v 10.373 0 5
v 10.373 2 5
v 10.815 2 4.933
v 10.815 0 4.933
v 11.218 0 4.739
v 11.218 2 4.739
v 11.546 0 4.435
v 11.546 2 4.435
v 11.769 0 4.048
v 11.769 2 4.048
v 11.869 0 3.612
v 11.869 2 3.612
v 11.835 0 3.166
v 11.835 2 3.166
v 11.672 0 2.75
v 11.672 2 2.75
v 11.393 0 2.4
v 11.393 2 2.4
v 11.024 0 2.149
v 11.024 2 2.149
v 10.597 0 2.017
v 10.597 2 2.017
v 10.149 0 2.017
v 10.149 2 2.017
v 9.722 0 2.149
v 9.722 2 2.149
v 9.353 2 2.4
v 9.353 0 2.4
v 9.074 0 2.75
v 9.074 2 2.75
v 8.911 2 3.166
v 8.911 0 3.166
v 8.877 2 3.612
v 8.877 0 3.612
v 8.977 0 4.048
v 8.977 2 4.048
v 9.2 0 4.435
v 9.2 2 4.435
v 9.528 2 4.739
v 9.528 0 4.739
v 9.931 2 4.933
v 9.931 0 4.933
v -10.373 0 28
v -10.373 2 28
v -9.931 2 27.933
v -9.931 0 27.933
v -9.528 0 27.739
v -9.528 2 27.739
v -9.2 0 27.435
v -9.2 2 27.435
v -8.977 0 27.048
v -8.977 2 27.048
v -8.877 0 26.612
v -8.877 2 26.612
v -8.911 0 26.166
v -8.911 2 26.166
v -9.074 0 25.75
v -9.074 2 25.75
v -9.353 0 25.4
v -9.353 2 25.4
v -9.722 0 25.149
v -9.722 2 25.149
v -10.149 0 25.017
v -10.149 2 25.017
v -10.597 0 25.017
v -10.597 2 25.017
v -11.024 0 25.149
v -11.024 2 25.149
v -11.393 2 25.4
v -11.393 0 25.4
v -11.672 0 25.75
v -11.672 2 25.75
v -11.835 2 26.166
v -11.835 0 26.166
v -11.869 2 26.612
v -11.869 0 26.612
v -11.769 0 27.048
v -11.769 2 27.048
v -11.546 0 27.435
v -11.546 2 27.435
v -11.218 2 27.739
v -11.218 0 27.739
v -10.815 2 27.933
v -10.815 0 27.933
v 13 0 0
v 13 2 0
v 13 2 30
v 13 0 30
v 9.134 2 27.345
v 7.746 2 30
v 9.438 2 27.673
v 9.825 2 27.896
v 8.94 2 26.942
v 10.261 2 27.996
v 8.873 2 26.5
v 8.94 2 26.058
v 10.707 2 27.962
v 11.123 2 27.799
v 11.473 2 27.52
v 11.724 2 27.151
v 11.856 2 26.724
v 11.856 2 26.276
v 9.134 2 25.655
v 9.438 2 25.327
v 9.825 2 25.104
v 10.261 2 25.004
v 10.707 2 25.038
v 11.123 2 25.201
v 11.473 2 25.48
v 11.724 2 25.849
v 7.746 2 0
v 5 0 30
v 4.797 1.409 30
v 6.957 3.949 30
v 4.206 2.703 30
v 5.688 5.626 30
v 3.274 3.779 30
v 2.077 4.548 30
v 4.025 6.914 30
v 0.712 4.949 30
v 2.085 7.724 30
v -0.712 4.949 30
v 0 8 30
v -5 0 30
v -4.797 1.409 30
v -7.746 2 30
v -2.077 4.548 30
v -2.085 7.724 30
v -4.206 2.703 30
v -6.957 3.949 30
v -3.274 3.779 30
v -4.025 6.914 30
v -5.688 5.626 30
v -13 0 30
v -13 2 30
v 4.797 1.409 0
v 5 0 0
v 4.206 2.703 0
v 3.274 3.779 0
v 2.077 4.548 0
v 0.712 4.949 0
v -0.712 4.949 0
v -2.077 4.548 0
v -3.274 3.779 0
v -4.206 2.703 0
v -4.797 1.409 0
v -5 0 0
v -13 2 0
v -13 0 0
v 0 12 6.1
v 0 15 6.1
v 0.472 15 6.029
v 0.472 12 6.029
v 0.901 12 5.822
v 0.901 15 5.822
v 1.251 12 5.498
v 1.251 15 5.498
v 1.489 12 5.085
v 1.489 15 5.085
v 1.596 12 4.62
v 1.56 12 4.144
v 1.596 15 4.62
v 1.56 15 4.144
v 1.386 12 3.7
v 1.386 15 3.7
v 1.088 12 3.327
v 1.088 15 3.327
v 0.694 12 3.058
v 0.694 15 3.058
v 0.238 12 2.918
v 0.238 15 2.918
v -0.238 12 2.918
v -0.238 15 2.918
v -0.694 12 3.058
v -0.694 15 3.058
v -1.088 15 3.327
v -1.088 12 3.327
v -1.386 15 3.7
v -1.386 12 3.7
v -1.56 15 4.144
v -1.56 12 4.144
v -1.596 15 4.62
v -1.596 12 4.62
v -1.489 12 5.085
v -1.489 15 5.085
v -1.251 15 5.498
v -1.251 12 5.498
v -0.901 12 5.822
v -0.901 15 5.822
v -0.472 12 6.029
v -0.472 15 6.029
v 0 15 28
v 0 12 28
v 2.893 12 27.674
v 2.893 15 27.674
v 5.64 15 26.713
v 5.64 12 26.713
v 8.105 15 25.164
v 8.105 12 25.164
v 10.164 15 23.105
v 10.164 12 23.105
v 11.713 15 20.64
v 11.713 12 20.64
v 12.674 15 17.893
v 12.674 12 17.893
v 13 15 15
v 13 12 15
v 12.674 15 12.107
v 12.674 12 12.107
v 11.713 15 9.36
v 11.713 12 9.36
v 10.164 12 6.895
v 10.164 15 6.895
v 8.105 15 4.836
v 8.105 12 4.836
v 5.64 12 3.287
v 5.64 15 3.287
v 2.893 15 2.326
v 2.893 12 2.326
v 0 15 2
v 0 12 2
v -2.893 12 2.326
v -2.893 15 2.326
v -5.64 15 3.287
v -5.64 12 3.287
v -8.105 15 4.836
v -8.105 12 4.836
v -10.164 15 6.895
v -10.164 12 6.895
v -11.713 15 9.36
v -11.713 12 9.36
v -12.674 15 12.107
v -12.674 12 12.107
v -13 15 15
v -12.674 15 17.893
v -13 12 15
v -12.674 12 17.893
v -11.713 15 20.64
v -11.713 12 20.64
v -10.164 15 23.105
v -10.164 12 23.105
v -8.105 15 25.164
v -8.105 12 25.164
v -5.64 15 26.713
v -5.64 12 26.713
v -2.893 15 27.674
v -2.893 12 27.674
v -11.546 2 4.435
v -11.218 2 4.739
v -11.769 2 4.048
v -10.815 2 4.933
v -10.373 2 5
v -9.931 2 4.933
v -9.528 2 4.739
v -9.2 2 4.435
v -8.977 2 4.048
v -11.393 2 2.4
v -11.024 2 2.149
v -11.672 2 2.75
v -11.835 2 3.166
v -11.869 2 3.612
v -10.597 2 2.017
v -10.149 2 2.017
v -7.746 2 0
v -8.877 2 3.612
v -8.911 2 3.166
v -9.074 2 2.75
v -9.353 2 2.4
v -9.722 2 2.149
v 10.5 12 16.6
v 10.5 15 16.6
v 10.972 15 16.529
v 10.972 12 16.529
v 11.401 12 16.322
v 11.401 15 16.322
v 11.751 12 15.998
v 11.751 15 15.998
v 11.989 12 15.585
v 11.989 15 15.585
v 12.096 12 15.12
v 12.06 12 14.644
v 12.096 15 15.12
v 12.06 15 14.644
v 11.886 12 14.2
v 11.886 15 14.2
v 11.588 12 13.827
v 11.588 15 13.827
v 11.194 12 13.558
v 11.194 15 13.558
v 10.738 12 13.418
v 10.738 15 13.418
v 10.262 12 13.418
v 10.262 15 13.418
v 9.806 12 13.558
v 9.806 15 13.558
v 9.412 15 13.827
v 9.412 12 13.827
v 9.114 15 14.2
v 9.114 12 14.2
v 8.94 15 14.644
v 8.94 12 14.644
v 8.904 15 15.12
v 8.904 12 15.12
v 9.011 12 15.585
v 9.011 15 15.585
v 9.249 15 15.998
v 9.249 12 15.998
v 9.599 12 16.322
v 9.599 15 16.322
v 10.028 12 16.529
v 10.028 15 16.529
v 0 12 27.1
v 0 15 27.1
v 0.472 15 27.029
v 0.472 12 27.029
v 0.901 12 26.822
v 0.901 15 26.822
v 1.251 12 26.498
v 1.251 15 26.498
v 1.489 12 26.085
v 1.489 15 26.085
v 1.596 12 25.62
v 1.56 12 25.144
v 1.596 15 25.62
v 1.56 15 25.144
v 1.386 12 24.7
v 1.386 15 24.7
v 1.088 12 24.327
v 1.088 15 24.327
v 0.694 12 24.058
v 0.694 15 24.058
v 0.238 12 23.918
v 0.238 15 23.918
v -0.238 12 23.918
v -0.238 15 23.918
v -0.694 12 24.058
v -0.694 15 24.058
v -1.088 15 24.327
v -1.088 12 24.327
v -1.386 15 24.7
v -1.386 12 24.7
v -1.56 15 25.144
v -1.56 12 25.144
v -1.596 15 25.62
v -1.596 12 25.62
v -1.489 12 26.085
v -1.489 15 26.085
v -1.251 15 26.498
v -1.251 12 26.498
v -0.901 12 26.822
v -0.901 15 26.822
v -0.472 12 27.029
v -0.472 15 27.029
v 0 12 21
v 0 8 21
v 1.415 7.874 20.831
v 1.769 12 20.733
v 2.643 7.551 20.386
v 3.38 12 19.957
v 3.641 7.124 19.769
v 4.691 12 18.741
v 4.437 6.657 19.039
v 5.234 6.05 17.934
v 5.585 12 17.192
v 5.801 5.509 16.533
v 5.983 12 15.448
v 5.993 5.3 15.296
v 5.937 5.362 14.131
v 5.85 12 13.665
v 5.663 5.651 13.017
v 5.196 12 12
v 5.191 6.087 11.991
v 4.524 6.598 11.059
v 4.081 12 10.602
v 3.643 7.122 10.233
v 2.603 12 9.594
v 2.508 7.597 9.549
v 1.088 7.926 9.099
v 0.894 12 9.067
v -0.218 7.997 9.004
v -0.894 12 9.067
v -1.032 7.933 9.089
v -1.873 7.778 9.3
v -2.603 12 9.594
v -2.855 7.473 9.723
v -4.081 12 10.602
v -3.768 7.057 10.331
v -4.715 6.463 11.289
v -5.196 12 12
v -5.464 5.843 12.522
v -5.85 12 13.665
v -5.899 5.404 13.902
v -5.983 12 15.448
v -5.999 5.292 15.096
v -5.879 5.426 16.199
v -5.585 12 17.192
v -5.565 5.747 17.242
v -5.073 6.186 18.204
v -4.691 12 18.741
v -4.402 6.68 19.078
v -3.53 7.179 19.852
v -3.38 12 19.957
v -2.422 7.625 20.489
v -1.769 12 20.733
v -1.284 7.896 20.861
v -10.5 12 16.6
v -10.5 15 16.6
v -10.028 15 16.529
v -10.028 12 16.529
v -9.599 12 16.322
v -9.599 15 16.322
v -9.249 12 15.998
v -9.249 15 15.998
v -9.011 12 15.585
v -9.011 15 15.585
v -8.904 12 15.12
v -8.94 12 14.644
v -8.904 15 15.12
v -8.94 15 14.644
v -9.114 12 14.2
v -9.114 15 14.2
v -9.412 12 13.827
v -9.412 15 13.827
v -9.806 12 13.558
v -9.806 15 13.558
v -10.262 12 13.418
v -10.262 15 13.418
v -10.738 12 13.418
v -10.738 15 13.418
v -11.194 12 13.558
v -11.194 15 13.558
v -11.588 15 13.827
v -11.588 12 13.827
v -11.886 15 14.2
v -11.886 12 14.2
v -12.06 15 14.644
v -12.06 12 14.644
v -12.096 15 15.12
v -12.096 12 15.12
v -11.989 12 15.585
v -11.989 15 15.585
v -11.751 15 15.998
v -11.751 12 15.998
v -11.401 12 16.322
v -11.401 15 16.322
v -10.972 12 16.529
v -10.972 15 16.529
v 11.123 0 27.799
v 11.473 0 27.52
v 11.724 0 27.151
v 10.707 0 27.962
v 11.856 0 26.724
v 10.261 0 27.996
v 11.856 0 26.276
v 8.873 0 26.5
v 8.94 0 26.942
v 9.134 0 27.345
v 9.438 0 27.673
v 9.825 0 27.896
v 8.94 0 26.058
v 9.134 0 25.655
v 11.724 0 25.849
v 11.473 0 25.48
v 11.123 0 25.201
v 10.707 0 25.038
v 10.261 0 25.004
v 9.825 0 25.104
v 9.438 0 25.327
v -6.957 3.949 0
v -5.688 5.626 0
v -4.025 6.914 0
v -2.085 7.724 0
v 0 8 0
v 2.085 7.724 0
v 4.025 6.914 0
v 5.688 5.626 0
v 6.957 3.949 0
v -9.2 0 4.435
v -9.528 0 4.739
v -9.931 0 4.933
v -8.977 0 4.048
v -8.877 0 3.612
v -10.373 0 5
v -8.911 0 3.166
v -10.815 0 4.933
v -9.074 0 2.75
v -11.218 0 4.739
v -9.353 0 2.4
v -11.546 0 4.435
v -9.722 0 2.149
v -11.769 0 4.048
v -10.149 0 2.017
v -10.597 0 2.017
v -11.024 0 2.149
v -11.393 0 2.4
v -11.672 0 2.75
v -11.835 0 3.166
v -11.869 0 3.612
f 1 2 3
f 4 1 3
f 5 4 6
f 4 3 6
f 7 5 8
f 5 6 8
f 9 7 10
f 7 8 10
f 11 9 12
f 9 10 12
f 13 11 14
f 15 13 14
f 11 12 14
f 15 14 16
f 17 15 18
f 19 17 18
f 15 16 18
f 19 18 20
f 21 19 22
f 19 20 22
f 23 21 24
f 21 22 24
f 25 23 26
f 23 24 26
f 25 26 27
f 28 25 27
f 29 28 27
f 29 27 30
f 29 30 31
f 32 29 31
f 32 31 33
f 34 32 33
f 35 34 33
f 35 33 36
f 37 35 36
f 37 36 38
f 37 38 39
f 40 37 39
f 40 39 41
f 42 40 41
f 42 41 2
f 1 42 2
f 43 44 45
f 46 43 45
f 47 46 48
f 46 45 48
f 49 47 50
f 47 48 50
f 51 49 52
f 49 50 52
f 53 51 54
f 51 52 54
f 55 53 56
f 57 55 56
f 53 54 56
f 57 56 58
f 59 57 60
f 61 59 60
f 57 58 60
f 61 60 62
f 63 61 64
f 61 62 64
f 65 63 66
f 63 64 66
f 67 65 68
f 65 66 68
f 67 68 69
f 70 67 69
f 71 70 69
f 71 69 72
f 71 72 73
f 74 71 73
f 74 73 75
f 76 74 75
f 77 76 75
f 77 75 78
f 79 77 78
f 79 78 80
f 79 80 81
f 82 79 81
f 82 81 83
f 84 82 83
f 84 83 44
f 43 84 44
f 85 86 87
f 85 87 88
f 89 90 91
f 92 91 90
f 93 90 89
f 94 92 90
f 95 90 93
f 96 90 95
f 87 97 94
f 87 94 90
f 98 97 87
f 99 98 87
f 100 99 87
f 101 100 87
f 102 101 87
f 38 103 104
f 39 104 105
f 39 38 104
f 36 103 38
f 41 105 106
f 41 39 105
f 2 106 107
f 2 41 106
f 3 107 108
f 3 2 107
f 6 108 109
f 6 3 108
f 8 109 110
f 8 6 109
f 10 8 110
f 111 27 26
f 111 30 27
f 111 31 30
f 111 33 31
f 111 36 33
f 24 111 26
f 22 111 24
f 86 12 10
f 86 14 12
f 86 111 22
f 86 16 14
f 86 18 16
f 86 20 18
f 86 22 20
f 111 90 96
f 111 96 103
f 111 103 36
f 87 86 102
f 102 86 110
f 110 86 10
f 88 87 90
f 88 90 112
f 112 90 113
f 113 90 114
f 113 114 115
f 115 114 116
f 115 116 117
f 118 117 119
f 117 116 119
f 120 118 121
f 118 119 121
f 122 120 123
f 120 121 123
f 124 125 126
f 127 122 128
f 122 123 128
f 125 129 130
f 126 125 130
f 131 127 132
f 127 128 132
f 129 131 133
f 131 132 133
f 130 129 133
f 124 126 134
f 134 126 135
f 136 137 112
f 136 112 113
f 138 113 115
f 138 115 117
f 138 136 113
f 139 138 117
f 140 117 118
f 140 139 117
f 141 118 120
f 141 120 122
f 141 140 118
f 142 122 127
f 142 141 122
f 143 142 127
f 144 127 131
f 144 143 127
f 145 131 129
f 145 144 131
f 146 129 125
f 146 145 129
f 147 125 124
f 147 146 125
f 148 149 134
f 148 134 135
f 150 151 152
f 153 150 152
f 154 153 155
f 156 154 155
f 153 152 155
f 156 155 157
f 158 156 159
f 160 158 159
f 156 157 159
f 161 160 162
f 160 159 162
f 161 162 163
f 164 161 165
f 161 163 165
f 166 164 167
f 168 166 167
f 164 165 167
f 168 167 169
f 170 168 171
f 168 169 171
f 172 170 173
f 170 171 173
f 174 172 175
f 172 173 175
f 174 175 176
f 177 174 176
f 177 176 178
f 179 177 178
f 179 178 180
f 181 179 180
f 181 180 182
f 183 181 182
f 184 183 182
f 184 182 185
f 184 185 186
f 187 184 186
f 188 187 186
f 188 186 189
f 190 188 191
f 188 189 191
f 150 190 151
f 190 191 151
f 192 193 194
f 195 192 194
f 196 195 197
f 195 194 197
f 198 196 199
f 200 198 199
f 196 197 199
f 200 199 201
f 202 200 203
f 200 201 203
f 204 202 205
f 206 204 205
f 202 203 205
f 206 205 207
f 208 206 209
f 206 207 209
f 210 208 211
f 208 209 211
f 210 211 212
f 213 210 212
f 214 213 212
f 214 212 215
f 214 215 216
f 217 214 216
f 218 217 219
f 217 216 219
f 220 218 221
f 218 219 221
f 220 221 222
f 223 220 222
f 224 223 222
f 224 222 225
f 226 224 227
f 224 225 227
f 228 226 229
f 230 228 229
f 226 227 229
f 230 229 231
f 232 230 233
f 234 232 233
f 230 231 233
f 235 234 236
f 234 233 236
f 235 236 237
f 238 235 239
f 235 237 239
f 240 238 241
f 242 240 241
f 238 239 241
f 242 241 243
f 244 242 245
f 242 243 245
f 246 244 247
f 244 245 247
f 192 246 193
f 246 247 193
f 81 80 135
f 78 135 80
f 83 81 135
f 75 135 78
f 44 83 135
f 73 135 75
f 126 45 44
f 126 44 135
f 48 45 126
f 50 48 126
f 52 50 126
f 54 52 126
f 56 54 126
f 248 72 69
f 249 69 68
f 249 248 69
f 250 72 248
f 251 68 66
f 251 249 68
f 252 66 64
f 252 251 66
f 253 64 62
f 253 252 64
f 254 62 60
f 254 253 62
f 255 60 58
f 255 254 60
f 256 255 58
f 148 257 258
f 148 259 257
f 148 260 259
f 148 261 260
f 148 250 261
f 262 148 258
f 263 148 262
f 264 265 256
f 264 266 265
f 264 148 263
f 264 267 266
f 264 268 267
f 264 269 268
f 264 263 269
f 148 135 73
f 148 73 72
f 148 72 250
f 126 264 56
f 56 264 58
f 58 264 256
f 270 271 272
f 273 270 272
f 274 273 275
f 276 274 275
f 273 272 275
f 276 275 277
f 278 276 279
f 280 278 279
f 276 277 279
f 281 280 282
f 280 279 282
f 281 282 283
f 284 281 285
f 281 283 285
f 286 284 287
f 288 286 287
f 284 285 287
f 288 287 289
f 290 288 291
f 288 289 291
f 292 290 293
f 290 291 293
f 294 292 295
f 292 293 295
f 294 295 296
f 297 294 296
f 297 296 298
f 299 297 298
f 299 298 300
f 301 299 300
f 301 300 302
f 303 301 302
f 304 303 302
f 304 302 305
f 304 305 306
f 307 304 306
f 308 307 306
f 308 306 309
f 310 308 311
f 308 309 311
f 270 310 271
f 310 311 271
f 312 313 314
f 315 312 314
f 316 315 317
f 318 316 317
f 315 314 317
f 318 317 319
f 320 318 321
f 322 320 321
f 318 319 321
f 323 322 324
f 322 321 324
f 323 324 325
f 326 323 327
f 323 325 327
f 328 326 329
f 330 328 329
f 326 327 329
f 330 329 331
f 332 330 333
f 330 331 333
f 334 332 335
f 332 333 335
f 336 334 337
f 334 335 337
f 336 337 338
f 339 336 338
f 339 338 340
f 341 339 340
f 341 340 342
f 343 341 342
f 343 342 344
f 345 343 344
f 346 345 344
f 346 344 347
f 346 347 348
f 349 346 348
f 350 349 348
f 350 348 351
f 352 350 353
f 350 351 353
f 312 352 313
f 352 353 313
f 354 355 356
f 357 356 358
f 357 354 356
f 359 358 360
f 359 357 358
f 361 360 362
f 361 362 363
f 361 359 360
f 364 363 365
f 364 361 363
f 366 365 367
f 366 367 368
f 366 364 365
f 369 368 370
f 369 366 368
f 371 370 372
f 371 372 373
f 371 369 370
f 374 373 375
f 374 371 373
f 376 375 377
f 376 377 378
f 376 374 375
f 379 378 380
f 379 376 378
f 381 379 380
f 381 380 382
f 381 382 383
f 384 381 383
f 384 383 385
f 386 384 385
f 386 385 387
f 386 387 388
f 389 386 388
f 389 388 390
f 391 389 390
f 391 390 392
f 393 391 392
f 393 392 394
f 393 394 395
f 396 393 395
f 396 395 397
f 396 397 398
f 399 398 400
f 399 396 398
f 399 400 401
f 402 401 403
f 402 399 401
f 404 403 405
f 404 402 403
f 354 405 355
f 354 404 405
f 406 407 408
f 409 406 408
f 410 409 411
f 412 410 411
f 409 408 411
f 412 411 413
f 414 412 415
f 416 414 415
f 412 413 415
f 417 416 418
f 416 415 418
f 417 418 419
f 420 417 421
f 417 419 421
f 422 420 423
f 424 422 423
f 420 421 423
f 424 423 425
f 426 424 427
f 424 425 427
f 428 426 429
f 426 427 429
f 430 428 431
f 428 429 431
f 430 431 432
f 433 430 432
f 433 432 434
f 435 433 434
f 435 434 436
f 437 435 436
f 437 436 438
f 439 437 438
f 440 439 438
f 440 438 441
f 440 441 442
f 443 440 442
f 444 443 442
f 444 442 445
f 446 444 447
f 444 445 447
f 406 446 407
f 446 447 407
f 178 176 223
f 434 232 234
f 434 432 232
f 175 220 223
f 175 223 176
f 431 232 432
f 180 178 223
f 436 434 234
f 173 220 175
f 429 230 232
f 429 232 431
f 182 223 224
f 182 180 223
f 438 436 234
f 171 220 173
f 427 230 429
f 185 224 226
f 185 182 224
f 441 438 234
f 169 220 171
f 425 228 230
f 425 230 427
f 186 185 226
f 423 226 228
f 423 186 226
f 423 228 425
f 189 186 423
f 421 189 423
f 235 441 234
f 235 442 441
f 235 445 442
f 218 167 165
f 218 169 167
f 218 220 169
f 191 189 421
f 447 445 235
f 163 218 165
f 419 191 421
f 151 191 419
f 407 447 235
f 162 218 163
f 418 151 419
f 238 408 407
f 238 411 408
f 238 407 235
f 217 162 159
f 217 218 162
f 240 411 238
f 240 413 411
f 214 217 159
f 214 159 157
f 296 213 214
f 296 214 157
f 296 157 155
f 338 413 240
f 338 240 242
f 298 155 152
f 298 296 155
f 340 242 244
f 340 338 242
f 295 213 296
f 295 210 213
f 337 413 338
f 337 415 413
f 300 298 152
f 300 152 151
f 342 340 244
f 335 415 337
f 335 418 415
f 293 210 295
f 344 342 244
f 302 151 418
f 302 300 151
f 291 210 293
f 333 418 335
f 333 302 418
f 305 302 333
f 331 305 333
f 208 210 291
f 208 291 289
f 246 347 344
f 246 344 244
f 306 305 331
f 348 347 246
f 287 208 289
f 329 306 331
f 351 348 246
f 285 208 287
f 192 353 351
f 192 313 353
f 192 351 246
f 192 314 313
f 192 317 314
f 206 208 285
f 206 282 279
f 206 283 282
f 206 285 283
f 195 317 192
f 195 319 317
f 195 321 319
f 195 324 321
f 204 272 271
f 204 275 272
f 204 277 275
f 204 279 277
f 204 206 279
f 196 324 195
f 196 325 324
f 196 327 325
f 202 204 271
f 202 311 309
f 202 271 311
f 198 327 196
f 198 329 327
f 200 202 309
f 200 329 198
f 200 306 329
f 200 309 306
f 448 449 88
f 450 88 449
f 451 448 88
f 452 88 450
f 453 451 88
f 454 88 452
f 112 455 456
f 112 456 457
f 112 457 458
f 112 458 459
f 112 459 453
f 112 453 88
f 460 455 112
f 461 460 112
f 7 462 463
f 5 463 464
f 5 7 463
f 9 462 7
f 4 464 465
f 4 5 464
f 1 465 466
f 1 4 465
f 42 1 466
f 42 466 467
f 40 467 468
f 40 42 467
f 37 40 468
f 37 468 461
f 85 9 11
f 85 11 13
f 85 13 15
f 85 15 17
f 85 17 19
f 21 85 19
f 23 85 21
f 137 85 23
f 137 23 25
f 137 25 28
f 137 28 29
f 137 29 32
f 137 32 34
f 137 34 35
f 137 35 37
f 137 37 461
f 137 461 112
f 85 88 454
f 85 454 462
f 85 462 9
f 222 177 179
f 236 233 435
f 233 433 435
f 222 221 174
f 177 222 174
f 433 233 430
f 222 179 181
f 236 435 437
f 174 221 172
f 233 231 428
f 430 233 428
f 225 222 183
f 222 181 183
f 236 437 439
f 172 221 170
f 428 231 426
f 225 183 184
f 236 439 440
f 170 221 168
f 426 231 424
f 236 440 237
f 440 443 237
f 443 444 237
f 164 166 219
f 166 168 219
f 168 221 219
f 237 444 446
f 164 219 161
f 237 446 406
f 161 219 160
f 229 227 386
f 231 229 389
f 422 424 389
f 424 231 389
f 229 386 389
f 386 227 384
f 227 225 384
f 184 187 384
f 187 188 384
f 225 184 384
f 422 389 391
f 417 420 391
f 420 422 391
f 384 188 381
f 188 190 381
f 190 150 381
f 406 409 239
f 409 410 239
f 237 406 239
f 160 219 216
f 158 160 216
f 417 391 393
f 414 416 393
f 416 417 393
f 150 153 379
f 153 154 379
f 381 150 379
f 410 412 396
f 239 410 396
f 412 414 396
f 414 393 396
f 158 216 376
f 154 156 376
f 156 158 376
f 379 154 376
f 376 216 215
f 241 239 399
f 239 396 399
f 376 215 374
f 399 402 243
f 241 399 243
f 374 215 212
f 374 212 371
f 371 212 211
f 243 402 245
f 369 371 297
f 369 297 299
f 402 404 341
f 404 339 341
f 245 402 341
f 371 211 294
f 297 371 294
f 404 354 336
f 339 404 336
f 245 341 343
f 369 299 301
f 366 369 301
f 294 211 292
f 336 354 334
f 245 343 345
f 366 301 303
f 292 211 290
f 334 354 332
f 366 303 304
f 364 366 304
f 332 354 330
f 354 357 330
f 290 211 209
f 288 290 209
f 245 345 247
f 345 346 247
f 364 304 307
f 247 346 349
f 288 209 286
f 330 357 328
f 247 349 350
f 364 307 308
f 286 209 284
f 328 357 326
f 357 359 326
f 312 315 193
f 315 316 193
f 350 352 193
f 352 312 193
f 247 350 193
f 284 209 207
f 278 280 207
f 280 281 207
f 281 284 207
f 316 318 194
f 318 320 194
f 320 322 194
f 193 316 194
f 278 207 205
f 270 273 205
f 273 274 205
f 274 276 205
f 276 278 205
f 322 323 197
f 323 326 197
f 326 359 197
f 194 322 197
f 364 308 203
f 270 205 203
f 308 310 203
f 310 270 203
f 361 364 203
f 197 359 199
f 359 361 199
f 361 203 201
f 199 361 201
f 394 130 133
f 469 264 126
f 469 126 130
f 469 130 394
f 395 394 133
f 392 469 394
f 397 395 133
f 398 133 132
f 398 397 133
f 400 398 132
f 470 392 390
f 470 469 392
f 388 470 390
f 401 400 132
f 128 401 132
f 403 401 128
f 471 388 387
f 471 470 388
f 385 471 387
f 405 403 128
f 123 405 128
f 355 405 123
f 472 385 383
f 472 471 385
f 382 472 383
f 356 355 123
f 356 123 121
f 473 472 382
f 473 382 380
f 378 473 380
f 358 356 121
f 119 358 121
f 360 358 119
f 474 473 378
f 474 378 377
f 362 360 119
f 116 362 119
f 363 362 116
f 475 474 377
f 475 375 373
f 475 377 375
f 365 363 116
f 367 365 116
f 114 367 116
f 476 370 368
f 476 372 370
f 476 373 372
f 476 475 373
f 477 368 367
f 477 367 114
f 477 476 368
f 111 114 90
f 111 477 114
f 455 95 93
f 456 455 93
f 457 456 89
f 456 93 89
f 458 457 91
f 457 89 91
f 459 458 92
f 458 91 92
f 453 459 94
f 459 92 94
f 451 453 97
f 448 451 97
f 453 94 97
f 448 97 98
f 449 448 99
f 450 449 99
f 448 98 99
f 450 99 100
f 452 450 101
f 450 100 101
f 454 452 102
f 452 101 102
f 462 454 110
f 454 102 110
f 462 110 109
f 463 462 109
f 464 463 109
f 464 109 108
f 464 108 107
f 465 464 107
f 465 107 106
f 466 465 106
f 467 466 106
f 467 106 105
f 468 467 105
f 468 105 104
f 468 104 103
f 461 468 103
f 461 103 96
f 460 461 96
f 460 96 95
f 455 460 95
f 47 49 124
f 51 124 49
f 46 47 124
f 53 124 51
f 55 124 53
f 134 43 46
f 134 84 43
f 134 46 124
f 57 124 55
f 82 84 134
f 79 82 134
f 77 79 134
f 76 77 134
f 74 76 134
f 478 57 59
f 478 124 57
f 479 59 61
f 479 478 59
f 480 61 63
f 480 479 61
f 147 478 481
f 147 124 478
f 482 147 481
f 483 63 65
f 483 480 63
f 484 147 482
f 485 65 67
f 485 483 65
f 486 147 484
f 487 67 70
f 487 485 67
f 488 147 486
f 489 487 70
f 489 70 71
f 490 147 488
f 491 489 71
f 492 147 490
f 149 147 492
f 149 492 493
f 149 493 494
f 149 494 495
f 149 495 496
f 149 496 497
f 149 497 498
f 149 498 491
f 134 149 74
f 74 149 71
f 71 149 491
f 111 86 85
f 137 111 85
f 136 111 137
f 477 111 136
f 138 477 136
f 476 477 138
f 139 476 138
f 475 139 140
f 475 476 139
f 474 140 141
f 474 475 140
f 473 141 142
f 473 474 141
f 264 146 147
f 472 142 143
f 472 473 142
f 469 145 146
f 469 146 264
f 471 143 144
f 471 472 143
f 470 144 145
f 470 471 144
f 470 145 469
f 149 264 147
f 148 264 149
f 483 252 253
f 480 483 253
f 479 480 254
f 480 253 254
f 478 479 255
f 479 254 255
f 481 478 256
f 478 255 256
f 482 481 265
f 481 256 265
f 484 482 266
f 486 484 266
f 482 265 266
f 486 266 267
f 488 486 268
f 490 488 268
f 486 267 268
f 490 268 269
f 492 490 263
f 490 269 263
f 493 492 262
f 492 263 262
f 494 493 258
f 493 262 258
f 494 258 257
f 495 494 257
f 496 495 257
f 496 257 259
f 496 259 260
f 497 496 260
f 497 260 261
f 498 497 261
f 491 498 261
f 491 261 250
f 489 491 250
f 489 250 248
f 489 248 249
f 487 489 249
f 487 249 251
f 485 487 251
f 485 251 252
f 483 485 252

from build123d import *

# Parameters (mm, degrees)
EXTRUDE_1_DEPTH      = 30
SKETCH_2_R           = 1.5
CUT_EXTRUDE_1_DEPTH  = 30
EXTRUDE_2_REACH      = 36.828
EXTRUDE_2_END_RADIUS = 8
SKETCH_3_R           = 6
SKETCH_4_R           = 13
EXTRUDE_3_DEPTH      = 3
SKETCH_6_R           = 1.6
CUT_EXTRUDE_2_DEPTH  = 3


with BuildPart() as part:
    # 草图1 → 凸台-拉伸1 (new body)
    with BuildSketch(Plane.XY):
        with BuildLine():
            Line((-8, 0), (-13, 0))
            Line((-13, 0), (-13, 2))
            Line((-13, 2), (-7.745966692, 2))
            ThreePointArc((-7.745966692, 2), (0, 8), (7.745966692, 2))
            Line((7.745966692, 2), (13, 2))
            Line((13, 2), (13, 0))
            Line((13, 0), (8, 0))
            Line((8, 0), (5, 0))
            ThreePointArc((5, 0), (0, 5), (-5, 0))
            Line((-5, 0), (-8, 0))
        make_face()
    extrude(amount=EXTRUDE_1_DEPTH)

    # 草图2 → 切除-拉伸1 (cut)
    with BuildSketch(Plane(origin=(0, 2, 0), x_dir=(1, 0, 0), z_dir=(0, 1, 0))):
        with Locations(Location((10.372983346, -3.5, 0), (0, 0, 270))):
            Circle(SKETCH_2_R)
        with Locations(Location((10.372983346, -26.5, 0), (0, 0, 180))):
            Circle(SKETCH_2_R)
        with Locations(Location((-10.372983346, -26.5, 0), (0, 0, 270))):
            Circle(SKETCH_2_R)
        with Locations(Location((-10.372983346, -3.5, 0), (0, 0, 270))):
            Circle(SKETCH_2_R)
    extrude(amount=-CUT_EXTRUDE_1_DEPTH, mode=Mode.SUBTRACT)

    # 凸台-拉伸2: up to this cylinder (the profile starts outside it)
    extrude_2_end = Plane(origin=(0, 0, 15), z_dir=(0, 0, -1)) * Cylinder(EXTRUDE_2_END_RADIUS, 90.656, mode=Mode.PRIVATE)
    # 草图3 → 凸台-拉伸2 (add, up to the surface)
    with BuildSketch(Plane(origin=(0, 12, 0), x_dir=(1, 0, 0), z_dir=(0, 1, 0)), mode=Mode.PRIVATE) as extrude_2_sk1:
        with Locations(Location((0, -15, 0), (0, 0, 270))):
            Circle(SKETCH_3_R)
    extrude_2_tool1 = extrude(extrude_2_sk1.sketch, amount=-EXTRUDE_2_REACH, mode=Mode.PRIVATE) - extrude_2_end
    add(extrude_2_tool1.solids().sort_by_distance((0, 12, 15))[0])

    # 草图4 → 凸台-拉伸3 (add)
    with BuildSketch(Plane(origin=(0, 12, 0), x_dir=(1, 0, 0), z_dir=(0, 1, 0))):
        with Locations(Location((0, -15, 0), (0, 0, 270))):
            Circle(SKETCH_4_R)
    extrude(amount=EXTRUDE_3_DEPTH)

    # 草图6 → 切除-拉伸2 (cut)
    with BuildSketch(Plane(origin=(0, 15, 0), x_dir=(1, 0, 0), z_dir=(0, 1, 0))):
        with Locations(Location((10.5, -15, 0), (0, 0, 270))):
            Circle(SKETCH_6_R)
        with Locations(Location((0, -25.5, 0), (0, 0, 270))):
            Circle(SKETCH_6_R)
        with Locations(Location((-10.5, -15, 0), (0, 0, 270))):
            Circle(SKETCH_6_R)
        with Locations(Location((0, -4.5, 0), (0, 0, 270))):
            Circle(SKETCH_6_R)
    extrude(amount=-CUT_EXTRUDE_2_DEPTH, mode=Mode.SUBTRACT)


solid = part.part
